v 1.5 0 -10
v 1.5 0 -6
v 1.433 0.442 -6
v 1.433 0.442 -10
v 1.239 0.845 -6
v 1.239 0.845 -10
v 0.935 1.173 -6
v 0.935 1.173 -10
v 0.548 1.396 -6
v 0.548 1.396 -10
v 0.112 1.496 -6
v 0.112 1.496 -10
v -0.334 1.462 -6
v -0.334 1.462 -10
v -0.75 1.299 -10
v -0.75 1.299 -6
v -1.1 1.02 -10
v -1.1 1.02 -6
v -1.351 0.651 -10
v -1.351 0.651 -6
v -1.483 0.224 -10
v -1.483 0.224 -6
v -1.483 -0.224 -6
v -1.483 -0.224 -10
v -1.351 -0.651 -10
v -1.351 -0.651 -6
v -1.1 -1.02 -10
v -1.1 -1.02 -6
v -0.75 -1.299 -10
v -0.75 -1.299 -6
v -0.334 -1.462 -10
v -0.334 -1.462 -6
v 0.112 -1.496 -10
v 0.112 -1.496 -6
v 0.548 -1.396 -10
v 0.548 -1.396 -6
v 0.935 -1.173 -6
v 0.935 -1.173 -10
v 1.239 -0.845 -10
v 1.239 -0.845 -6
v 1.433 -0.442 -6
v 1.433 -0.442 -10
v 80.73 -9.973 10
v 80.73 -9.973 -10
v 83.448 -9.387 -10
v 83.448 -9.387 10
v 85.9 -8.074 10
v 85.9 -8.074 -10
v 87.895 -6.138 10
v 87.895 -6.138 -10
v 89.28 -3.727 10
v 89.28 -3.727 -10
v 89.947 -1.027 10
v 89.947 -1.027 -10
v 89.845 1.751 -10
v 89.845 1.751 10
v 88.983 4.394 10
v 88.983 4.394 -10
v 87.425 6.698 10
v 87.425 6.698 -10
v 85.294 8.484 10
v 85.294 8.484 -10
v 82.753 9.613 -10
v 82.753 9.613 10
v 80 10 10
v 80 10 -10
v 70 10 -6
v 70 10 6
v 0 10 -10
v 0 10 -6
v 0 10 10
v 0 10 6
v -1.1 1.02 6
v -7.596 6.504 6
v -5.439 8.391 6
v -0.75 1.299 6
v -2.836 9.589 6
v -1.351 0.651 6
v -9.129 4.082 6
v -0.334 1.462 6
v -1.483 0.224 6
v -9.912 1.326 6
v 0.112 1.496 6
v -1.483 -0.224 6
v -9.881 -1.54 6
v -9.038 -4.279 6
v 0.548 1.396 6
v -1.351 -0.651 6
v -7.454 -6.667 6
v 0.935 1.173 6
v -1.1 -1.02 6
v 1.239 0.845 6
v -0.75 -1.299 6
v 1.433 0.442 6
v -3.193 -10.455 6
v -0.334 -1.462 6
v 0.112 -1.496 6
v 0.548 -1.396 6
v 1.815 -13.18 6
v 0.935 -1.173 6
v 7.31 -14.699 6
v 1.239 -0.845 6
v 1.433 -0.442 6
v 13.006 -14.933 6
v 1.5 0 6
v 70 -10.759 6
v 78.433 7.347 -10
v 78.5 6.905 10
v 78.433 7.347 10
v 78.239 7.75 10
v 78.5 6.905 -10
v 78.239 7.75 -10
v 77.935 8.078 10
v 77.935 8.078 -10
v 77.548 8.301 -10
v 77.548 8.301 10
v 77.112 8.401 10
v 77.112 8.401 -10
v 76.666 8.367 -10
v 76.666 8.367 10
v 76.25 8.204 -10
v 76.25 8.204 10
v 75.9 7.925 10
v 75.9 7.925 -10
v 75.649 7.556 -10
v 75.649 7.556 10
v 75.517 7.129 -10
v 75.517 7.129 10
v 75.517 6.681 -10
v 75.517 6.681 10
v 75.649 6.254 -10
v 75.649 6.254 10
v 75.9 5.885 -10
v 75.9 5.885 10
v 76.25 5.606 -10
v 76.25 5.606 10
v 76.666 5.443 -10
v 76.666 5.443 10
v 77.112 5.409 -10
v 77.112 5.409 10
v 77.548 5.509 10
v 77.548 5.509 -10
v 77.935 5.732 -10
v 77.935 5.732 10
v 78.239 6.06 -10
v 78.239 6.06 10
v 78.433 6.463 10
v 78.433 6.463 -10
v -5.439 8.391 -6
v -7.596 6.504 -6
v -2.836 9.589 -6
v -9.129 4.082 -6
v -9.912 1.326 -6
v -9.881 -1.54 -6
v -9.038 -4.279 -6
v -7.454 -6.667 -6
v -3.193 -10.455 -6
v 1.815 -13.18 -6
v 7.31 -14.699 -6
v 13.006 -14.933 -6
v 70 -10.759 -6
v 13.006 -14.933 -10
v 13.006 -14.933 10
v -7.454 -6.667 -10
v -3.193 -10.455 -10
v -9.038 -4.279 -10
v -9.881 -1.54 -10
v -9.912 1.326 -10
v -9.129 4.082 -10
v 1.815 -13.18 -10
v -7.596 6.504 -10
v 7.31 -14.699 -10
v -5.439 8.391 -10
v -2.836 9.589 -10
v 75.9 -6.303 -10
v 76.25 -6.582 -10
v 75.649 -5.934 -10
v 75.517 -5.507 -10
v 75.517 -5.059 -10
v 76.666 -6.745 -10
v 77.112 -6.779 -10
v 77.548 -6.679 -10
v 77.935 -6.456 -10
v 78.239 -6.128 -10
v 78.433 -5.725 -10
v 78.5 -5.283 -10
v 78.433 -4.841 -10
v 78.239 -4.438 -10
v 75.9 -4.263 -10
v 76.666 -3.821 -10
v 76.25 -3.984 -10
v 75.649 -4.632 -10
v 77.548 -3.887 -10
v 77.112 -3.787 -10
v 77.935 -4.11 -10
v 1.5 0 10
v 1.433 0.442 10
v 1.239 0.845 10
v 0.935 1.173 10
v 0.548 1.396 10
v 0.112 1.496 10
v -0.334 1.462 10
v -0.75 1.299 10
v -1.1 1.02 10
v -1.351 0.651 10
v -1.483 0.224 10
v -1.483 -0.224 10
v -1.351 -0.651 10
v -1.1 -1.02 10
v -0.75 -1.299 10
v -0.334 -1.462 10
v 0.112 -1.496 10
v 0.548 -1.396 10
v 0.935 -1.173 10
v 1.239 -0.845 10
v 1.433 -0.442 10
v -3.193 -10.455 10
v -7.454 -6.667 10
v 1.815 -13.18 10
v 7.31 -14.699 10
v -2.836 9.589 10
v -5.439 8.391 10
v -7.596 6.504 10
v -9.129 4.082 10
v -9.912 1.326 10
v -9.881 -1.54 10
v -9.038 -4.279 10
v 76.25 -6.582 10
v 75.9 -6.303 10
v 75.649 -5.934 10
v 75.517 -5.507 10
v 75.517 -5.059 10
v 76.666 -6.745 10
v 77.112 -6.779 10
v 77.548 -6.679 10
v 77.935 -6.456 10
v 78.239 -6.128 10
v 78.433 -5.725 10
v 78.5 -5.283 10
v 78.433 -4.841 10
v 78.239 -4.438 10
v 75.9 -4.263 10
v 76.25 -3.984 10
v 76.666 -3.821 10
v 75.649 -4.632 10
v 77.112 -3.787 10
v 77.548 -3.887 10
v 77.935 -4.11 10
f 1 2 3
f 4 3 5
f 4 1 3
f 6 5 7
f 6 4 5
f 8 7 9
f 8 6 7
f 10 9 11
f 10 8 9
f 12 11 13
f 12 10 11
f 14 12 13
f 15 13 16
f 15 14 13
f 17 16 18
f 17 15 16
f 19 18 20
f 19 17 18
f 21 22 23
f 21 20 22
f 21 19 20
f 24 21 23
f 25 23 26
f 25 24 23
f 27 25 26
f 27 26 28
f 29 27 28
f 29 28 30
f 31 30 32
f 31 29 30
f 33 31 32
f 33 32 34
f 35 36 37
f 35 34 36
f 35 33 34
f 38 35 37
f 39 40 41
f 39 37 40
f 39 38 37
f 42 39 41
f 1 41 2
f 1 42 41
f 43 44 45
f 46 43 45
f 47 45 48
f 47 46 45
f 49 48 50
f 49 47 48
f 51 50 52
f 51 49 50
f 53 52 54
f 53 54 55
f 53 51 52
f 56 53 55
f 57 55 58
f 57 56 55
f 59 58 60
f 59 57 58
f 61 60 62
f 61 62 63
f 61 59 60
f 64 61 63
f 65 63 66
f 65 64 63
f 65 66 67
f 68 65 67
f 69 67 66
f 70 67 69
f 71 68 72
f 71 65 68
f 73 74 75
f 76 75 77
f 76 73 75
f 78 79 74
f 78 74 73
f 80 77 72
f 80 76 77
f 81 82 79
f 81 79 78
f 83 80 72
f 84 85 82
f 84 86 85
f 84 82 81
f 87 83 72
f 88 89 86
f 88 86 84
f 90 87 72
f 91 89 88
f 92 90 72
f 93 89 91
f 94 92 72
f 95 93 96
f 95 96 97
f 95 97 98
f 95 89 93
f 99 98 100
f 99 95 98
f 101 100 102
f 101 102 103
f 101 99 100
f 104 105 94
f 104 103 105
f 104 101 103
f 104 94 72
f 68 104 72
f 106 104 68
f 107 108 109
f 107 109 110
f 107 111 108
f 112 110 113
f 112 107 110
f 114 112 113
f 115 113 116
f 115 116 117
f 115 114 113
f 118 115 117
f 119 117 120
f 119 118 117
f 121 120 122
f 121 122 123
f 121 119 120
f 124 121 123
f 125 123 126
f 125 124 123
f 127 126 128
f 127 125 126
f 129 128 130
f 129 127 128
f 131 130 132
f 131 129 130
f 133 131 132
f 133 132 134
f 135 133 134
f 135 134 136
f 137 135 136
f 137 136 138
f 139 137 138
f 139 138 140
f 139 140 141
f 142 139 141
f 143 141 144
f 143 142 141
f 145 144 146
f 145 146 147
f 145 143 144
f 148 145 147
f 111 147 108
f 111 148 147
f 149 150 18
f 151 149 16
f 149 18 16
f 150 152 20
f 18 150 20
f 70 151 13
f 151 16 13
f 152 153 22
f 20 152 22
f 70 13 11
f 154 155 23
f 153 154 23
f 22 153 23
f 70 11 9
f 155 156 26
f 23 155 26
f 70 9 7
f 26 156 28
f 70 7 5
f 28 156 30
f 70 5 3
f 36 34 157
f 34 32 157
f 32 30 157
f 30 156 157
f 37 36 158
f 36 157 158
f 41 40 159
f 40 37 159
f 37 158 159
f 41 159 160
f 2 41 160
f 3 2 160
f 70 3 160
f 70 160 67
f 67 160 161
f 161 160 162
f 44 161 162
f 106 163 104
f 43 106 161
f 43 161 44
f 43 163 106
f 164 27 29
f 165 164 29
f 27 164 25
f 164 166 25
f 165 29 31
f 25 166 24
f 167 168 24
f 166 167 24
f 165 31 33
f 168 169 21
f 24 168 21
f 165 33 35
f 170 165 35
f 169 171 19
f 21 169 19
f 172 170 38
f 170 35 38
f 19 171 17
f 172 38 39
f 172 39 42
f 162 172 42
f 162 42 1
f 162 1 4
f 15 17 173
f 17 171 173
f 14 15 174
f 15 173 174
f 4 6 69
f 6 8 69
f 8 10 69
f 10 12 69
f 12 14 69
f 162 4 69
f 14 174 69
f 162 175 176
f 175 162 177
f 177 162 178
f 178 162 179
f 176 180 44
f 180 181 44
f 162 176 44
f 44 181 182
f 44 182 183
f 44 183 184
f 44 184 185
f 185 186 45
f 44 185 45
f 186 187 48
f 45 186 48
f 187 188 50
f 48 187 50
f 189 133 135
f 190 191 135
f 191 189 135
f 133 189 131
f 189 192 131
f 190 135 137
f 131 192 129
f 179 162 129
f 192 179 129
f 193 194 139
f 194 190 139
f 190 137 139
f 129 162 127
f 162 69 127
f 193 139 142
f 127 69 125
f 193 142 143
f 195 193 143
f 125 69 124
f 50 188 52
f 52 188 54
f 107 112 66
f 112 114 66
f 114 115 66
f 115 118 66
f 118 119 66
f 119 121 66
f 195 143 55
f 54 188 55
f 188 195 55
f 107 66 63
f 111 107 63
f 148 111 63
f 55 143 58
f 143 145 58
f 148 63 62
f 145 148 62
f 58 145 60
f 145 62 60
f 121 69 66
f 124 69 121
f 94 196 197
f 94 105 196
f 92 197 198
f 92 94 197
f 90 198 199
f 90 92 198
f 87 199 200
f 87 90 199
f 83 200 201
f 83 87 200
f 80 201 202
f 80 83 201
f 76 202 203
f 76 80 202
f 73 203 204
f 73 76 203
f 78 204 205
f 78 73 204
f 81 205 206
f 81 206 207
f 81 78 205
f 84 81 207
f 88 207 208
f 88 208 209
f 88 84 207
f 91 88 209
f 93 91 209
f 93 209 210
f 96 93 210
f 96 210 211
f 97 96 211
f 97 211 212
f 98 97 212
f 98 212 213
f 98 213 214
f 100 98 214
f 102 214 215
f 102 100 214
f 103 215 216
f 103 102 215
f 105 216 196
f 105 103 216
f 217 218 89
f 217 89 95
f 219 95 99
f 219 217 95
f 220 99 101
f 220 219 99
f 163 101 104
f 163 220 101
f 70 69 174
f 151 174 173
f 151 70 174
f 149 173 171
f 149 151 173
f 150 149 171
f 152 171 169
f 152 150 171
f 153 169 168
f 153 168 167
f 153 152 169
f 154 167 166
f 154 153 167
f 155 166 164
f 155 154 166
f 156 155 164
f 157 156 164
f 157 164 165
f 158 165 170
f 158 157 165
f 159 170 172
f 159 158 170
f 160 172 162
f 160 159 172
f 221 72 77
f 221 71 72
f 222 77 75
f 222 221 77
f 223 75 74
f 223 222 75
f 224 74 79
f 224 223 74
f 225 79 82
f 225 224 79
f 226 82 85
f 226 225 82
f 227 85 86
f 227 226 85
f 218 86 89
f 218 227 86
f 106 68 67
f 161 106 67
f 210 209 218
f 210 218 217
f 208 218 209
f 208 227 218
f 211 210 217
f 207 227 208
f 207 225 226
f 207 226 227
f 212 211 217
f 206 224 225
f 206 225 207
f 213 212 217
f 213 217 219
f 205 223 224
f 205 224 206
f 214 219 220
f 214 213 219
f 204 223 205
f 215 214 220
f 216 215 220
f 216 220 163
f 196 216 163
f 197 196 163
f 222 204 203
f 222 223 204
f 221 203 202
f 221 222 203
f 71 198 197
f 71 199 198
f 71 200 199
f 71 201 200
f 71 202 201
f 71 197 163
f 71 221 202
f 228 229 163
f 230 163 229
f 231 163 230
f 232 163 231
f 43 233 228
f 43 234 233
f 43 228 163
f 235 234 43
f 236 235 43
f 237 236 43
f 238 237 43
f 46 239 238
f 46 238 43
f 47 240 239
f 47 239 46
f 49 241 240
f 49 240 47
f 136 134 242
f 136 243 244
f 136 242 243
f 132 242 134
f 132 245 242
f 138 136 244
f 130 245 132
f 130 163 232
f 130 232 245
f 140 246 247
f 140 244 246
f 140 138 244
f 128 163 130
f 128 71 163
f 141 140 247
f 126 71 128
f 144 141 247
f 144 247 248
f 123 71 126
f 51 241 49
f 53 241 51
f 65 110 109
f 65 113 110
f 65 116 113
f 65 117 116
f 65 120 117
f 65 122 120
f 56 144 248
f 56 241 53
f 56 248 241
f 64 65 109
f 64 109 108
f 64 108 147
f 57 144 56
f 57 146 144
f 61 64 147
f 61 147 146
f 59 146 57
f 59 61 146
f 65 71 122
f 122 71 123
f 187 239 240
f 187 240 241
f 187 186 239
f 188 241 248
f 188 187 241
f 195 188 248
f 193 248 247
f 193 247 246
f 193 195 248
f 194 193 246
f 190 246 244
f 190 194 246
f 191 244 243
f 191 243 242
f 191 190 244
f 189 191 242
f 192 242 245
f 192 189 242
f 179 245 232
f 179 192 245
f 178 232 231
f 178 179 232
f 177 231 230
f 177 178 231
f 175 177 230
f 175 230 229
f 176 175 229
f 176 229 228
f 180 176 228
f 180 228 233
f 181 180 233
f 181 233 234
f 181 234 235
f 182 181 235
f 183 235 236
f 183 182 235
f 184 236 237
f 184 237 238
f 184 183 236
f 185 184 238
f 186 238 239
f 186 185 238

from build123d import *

# Parameters (mm, degrees)
SKETCH1_R               = 1.5
BOSS_EXTRUDE1_DEPTH     = 10
SKETCH2_W               = 140
SKETCH2_H               = 12
CUT_EXTRUDE1_DEPTH      = 11
CUT_EXTRUDE1_DEPTH_BACK = 16


with BuildPart() as part:
    # Sketch1 → Boss-Extrude1 (new body, symmetric)
    with BuildSketch(Plane.XY):
        with BuildLine():
            Line((43.628033294, 10), (0, 10))
            ThreePointArc((0, 10), (-9.128709292, 4.082482905), (-7.453559925, -6.666666667))
            ThreePointArc((-7.453559925, -6.666666667), (1.814979124, -13.179517203), (13.006384648, -14.933222025))
            Line((13.006384648, -14.933222025), (80.730417904, -9.97328881))
            ThreePointArc((80.730417904, -9.97328881), (89.993319971, 0.365453076), (80, 10))
            Line((80, 10), (43.628033294, 10))
        make_face()
        with Locations((77, -5.283013816)):
            Circle(SKETCH1_R, mode=Mode.SUBTRACT)
        with Locations((77, 6.904943152)):
            Circle(SKETCH1_R, mode=Mode.SUBTRACT)
        Circle(SKETCH1_R, mode=Mode.SUBTRACT)
    extrude(amount=BOSS_EXTRUDE1_DEPTH, both=True)

    # Sketch2 → Cut-Extrude1 (cut, two sides)
    with BuildSketch(Plane(origin=(0, 0, 0), x_dir=(1, 0, 0), z_dir=(0, 1, 0))) as cut_extrude1_sk:
        Rectangle(SKETCH2_W, SKETCH2_H)
    extrude(amount=CUT_EXTRUDE1_DEPTH, mode=Mode.SUBTRACT)
    extrude(cut_extrude1_sk.sketch, amount=-CUT_EXTRUDE1_DEPTH_BACK, mode=Mode.SUBTRACT)


solid = part.part
